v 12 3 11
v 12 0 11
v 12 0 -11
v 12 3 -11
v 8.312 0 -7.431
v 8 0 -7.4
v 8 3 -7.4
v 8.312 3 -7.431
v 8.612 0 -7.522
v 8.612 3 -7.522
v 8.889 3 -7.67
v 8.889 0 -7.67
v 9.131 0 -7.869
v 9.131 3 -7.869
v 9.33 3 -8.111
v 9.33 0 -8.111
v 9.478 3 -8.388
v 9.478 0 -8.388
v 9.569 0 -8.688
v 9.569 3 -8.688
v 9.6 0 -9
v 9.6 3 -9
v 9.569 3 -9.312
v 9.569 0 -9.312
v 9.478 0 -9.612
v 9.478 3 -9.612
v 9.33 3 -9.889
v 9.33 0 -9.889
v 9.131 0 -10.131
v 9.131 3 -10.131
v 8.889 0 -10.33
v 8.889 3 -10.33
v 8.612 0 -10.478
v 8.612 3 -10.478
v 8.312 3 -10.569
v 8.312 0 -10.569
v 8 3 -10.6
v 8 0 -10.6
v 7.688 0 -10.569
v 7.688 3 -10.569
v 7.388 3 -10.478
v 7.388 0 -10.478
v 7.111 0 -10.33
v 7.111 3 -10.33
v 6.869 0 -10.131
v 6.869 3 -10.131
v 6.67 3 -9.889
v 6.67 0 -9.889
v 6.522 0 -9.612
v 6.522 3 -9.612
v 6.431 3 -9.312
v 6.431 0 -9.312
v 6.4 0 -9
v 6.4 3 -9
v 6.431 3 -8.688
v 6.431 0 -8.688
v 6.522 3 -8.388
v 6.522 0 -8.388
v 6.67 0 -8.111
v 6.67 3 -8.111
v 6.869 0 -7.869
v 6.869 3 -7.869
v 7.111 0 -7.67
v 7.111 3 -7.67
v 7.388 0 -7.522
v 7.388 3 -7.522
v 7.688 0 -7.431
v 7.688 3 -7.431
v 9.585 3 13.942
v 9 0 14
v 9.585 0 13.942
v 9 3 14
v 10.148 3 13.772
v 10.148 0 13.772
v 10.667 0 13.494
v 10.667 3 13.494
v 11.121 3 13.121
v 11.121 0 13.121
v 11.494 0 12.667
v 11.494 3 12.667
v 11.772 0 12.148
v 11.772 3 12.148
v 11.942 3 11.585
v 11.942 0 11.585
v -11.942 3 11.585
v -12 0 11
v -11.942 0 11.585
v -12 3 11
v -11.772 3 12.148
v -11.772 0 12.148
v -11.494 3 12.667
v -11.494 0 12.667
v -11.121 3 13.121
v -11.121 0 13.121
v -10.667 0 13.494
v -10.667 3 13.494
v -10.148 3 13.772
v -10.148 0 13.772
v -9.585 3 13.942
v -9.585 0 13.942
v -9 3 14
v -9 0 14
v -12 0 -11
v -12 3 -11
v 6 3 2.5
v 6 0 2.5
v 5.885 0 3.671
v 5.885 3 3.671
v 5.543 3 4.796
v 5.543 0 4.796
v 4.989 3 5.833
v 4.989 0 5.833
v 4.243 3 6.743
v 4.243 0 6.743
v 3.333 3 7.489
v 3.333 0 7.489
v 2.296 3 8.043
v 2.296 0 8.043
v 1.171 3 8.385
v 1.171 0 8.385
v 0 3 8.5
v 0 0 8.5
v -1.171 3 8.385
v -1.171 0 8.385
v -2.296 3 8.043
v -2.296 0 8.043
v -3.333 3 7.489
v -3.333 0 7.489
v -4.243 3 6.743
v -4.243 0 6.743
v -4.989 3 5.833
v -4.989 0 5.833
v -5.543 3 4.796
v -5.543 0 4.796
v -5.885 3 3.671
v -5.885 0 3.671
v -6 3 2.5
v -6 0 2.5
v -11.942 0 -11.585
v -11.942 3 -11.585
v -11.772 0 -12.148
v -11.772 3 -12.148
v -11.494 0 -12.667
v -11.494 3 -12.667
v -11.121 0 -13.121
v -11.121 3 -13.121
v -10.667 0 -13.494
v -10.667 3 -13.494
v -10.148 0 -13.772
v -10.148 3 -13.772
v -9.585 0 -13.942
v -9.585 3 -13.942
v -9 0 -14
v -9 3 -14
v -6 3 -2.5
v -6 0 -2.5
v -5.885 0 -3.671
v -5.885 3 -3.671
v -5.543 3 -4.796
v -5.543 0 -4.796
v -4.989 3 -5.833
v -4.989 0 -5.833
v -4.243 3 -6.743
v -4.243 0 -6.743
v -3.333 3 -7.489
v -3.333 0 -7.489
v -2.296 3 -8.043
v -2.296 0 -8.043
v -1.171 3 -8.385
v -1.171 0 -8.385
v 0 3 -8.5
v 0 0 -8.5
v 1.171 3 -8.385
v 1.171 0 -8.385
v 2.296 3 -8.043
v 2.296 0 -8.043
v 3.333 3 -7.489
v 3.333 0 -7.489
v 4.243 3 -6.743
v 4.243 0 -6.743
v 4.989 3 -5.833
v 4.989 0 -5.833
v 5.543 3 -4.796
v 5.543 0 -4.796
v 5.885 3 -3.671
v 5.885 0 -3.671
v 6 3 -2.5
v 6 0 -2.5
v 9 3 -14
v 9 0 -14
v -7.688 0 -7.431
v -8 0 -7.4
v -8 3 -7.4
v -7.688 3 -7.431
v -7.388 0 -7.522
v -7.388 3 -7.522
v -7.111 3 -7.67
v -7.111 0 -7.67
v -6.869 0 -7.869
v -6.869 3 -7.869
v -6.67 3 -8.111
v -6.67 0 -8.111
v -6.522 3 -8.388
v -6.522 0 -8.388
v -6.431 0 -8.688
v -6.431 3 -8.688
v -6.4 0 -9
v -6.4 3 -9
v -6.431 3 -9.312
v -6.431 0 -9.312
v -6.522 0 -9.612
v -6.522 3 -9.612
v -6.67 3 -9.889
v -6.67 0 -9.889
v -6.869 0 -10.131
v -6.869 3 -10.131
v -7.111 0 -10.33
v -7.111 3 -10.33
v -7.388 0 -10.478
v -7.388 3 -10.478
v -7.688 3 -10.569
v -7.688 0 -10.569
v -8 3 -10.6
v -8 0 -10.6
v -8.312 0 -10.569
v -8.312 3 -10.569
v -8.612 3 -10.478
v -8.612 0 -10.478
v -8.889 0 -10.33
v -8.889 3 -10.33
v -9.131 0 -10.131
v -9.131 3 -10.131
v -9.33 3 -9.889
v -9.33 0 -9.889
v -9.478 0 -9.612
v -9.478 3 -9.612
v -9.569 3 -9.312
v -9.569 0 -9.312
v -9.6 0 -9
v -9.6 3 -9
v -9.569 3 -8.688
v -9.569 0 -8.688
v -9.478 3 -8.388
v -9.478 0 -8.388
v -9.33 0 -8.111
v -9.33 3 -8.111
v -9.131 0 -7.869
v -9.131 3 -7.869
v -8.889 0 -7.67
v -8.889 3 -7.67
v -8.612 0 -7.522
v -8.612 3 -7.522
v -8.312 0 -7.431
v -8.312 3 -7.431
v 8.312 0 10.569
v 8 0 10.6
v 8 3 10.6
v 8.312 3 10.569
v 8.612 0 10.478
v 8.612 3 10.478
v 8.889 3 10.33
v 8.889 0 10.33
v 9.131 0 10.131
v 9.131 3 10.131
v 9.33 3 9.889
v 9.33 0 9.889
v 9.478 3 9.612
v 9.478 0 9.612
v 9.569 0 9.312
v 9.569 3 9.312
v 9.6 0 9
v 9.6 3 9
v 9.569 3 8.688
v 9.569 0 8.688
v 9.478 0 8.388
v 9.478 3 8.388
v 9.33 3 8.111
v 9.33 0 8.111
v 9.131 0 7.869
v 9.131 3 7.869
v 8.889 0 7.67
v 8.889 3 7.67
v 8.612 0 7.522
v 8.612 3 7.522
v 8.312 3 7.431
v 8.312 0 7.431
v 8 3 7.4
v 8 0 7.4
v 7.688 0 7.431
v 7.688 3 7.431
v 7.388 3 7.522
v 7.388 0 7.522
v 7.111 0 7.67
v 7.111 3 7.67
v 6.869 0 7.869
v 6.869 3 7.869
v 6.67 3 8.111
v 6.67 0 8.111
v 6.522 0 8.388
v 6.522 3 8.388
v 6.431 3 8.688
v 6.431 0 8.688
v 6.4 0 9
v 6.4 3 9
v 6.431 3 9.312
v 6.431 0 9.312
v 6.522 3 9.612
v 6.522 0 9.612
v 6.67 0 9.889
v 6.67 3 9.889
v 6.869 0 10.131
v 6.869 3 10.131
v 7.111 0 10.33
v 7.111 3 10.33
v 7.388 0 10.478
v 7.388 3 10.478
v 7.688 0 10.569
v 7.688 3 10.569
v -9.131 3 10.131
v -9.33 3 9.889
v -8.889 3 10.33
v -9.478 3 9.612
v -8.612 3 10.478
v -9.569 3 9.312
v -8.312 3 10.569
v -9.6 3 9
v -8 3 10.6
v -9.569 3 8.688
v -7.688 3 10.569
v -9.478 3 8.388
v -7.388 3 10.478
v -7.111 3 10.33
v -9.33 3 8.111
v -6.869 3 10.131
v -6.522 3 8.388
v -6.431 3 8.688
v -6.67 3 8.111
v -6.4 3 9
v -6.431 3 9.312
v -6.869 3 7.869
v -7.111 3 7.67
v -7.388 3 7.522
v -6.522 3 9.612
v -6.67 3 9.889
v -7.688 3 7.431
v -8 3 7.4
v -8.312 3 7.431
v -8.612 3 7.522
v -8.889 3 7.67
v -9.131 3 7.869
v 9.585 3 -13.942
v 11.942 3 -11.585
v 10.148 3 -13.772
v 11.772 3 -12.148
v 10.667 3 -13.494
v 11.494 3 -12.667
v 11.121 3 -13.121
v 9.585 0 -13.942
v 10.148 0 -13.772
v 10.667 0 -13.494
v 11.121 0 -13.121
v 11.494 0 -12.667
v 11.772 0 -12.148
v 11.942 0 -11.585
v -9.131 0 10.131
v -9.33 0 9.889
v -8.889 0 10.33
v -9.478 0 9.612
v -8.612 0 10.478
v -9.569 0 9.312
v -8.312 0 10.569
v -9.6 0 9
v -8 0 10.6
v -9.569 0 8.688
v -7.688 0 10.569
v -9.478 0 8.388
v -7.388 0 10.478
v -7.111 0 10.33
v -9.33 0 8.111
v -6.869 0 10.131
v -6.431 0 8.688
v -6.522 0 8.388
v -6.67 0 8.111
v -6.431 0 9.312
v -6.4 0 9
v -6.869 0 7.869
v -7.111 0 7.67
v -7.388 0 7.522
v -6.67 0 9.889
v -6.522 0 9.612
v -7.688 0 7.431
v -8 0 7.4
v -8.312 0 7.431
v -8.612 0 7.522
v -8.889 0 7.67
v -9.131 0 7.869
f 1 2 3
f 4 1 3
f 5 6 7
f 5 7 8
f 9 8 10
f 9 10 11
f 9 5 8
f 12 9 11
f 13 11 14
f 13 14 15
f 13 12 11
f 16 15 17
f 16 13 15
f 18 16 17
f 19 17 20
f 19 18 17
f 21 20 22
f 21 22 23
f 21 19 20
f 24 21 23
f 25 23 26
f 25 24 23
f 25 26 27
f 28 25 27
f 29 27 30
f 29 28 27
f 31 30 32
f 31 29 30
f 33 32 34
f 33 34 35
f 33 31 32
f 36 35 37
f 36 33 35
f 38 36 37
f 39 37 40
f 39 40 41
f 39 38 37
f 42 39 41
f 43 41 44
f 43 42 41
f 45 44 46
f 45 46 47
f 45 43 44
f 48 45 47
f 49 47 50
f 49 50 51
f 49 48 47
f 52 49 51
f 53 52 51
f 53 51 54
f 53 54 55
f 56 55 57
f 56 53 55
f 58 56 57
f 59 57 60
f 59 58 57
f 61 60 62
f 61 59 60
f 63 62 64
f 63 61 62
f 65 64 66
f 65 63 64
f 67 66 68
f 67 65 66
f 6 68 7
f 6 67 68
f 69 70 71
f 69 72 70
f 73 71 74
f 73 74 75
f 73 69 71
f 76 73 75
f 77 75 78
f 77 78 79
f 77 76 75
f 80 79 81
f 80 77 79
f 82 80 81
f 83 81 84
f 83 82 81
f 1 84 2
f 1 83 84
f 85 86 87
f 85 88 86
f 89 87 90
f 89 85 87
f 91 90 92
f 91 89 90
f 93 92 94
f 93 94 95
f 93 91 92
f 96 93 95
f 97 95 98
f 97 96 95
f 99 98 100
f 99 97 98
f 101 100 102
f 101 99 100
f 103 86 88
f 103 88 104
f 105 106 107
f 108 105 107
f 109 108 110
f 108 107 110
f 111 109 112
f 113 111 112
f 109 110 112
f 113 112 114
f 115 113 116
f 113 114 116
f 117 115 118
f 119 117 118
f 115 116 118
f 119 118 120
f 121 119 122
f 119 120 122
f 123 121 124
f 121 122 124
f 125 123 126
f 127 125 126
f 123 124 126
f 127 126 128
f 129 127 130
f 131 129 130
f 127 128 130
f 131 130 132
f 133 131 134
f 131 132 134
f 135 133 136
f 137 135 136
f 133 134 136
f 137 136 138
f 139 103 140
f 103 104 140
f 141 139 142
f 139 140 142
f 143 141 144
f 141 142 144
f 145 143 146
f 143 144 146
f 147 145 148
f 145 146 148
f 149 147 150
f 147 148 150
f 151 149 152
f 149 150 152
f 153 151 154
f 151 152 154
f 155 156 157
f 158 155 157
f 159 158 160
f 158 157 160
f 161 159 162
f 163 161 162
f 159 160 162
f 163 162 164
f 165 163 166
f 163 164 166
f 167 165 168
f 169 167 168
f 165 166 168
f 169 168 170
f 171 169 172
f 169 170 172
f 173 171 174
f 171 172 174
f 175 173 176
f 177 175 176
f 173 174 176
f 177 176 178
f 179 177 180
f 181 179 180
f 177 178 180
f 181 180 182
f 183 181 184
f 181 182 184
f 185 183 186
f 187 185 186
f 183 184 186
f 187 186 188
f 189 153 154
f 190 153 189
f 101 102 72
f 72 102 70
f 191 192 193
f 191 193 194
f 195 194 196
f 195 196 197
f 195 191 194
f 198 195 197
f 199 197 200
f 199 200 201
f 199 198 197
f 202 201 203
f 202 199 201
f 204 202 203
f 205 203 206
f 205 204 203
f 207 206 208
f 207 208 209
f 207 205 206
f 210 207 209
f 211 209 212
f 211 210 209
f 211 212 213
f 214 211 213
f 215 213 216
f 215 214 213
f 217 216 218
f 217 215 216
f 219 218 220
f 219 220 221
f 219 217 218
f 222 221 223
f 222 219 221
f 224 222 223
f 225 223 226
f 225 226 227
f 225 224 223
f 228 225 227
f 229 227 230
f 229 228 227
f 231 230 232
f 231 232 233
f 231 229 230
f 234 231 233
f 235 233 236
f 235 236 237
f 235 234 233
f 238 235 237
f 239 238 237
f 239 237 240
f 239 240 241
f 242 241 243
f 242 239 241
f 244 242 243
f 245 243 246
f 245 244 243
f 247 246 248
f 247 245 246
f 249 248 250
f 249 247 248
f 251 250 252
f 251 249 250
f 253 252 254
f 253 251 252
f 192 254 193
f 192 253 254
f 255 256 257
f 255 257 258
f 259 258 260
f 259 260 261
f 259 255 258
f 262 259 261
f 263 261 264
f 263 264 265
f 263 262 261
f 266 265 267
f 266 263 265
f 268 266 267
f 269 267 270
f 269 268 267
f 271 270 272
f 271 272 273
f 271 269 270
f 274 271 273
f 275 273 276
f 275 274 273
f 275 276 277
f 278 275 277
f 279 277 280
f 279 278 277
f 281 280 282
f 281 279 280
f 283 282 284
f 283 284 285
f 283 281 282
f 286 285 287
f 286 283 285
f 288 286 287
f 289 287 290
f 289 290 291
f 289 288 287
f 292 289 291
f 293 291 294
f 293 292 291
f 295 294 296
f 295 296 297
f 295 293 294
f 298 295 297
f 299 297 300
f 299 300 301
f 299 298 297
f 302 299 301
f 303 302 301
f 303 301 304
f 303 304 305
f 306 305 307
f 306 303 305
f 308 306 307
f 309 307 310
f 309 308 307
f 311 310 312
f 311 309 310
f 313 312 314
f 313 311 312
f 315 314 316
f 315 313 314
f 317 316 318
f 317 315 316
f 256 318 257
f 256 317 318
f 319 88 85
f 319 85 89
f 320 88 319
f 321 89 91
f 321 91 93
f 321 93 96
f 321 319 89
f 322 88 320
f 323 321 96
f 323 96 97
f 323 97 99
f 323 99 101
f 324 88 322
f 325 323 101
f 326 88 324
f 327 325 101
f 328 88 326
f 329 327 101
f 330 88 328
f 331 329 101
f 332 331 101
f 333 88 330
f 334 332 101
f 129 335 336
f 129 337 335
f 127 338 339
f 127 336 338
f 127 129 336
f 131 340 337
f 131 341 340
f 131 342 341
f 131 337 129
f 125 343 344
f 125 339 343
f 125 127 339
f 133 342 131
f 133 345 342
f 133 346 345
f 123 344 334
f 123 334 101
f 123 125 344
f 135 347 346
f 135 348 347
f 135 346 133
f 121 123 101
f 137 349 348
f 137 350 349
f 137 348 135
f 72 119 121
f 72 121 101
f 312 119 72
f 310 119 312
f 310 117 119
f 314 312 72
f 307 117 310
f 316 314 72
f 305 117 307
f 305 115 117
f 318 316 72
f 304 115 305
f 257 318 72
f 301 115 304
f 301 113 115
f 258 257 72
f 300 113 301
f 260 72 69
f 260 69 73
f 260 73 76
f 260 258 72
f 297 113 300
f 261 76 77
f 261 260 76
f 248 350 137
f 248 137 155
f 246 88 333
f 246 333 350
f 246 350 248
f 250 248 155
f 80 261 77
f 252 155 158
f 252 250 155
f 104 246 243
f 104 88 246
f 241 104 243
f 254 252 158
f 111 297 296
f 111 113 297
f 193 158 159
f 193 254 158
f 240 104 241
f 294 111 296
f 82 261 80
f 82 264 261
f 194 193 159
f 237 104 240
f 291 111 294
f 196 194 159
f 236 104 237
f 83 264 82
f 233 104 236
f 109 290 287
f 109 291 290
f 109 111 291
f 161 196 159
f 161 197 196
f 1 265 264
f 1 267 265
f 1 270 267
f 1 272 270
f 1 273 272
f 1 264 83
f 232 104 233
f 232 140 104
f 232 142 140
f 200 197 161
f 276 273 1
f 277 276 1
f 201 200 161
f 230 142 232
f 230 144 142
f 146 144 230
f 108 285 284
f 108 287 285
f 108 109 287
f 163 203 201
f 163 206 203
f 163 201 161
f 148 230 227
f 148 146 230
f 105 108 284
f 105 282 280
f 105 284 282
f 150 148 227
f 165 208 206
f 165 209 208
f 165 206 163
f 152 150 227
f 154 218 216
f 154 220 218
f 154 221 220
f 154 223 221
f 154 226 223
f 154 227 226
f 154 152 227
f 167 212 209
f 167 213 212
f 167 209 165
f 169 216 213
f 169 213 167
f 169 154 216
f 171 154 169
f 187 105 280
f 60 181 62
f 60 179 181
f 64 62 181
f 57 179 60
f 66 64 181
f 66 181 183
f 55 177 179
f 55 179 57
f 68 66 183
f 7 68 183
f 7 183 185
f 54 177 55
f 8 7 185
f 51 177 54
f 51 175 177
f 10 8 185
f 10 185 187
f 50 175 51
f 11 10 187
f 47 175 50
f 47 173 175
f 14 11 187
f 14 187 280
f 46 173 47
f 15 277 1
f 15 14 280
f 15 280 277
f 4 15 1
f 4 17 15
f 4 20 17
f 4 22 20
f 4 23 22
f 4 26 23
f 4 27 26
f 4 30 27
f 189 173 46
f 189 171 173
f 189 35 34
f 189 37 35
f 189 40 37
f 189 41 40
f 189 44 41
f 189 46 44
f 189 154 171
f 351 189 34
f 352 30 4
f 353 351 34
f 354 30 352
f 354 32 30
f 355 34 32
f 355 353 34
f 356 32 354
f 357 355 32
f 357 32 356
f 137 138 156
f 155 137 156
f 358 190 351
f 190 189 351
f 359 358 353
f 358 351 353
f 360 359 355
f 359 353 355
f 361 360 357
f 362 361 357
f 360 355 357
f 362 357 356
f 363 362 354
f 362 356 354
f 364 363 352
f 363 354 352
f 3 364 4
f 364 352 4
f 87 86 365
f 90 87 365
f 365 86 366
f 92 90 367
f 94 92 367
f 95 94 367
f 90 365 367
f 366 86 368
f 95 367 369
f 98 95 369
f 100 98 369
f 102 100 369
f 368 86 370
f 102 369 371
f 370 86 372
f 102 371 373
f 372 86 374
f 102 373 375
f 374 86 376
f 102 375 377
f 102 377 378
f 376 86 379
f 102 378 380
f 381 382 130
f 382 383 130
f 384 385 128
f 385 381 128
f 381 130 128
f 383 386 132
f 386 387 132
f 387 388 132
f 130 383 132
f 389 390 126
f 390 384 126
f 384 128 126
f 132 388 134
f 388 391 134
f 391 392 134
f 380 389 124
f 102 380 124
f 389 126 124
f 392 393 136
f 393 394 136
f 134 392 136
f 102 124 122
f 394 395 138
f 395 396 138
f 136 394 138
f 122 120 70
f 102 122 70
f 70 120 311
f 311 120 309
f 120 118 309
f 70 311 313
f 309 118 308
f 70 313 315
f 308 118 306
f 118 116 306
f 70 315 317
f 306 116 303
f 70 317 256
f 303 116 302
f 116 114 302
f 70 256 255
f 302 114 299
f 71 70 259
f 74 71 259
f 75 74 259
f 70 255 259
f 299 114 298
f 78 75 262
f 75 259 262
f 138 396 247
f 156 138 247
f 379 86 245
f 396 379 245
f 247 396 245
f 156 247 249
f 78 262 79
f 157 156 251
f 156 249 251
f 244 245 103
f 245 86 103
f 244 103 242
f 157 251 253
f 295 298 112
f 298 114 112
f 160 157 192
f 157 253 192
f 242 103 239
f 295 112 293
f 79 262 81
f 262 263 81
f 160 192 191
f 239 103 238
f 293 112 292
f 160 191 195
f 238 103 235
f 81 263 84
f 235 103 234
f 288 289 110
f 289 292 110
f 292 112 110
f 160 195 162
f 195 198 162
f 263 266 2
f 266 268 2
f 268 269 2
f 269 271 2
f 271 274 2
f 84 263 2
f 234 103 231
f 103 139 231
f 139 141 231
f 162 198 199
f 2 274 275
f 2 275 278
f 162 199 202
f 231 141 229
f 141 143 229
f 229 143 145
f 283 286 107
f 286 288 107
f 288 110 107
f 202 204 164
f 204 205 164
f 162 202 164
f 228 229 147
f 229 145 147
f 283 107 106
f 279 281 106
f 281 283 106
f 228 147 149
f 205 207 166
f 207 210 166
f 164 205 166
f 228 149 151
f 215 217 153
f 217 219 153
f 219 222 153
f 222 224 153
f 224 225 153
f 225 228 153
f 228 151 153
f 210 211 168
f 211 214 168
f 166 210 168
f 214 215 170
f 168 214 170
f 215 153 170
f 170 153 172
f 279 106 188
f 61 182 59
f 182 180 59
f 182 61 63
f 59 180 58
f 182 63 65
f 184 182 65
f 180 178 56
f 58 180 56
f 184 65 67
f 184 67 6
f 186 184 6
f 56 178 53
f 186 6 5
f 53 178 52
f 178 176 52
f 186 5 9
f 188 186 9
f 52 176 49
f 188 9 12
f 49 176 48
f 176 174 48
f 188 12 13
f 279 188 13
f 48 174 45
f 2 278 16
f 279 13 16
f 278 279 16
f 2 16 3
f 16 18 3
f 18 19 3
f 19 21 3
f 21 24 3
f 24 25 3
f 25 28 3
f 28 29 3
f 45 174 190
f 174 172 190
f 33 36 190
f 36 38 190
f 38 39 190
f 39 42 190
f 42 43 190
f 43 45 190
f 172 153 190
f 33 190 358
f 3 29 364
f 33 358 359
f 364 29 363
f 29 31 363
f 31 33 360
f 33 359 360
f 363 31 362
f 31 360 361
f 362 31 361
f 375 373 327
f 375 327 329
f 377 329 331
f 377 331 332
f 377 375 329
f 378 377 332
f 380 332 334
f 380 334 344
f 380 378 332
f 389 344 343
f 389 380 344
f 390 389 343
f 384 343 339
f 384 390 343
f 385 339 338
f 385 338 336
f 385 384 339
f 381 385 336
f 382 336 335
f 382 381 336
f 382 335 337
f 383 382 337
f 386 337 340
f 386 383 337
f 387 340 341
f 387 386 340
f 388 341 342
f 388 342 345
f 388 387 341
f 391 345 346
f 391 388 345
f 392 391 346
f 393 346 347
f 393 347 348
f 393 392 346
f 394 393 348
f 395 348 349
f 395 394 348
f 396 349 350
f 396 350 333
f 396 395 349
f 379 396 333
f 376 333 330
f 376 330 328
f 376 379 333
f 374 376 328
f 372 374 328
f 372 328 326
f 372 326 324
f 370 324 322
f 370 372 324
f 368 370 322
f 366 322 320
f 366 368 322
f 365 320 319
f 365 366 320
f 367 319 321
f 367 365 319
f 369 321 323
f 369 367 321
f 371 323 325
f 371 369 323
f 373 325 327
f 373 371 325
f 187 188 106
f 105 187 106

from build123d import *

# Parameters (mm, degrees)
SKETCH_1_W      = 24
SKETCH_1_H      = 28
SKETCH_1_R      = 1.6
EXTRUDE_1_DEPTH = 3
FILLET_1_R      = 3


with BuildPart() as part:
    # 草图1 → 凸台-拉伸1 (new body)
    with BuildSketch(Plane(origin=(0, 0, 0), x_dir=(1, 0, 0), z_dir=(0, 1, 0))):
        Rectangle(SKETCH_1_W, SKETCH_1_H)
        with Locations(Location((8, -9, 0), (0, 0, 270))):
            Circle(SKETCH_1_R, mode=Mode.SUBTRACT)
        with Locations(Location((-8, -9, 0), (0, 0, 270))):
            Circle(SKETCH_1_R, mode=Mode.SUBTRACT)
        with Locations(Location((-8, 9, 0), (0, 0, 270))):
            Circle(SKETCH_1_R, mode=Mode.SUBTRACT)
        with Locations(Location((8, 9, 0), (0, 0, 270))):
            Circle(SKETCH_1_R, mode=Mode.SUBTRACT)
        with BuildLine():
            Line((6, 2.5), (6, -2.5))
            ThreePointArc((6, -2.5), (0, -8.5), (-6, -2.5))
            Line((-6, -2.5), (-6, 2.5))
            ThreePointArc((-6, 2.5), (0, 8.5), (6, 2.5))
        make_face(mode=Mode.SUBTRACT)
    extrude(amount=EXTRUDE_1_DEPTH)

    # 圆角1
    fillet_1_edges = [part.edges().sort_by_distance(p)[0] for p in [
        (12, 1.5, 14),
        (-12, 1.5, 14),
        (-12, 1.5, -14),
        (12, 1.5, -14),
    ]]
    fillet(fillet_1_edges, radius=FILLET_1_R)


solid = part.part
